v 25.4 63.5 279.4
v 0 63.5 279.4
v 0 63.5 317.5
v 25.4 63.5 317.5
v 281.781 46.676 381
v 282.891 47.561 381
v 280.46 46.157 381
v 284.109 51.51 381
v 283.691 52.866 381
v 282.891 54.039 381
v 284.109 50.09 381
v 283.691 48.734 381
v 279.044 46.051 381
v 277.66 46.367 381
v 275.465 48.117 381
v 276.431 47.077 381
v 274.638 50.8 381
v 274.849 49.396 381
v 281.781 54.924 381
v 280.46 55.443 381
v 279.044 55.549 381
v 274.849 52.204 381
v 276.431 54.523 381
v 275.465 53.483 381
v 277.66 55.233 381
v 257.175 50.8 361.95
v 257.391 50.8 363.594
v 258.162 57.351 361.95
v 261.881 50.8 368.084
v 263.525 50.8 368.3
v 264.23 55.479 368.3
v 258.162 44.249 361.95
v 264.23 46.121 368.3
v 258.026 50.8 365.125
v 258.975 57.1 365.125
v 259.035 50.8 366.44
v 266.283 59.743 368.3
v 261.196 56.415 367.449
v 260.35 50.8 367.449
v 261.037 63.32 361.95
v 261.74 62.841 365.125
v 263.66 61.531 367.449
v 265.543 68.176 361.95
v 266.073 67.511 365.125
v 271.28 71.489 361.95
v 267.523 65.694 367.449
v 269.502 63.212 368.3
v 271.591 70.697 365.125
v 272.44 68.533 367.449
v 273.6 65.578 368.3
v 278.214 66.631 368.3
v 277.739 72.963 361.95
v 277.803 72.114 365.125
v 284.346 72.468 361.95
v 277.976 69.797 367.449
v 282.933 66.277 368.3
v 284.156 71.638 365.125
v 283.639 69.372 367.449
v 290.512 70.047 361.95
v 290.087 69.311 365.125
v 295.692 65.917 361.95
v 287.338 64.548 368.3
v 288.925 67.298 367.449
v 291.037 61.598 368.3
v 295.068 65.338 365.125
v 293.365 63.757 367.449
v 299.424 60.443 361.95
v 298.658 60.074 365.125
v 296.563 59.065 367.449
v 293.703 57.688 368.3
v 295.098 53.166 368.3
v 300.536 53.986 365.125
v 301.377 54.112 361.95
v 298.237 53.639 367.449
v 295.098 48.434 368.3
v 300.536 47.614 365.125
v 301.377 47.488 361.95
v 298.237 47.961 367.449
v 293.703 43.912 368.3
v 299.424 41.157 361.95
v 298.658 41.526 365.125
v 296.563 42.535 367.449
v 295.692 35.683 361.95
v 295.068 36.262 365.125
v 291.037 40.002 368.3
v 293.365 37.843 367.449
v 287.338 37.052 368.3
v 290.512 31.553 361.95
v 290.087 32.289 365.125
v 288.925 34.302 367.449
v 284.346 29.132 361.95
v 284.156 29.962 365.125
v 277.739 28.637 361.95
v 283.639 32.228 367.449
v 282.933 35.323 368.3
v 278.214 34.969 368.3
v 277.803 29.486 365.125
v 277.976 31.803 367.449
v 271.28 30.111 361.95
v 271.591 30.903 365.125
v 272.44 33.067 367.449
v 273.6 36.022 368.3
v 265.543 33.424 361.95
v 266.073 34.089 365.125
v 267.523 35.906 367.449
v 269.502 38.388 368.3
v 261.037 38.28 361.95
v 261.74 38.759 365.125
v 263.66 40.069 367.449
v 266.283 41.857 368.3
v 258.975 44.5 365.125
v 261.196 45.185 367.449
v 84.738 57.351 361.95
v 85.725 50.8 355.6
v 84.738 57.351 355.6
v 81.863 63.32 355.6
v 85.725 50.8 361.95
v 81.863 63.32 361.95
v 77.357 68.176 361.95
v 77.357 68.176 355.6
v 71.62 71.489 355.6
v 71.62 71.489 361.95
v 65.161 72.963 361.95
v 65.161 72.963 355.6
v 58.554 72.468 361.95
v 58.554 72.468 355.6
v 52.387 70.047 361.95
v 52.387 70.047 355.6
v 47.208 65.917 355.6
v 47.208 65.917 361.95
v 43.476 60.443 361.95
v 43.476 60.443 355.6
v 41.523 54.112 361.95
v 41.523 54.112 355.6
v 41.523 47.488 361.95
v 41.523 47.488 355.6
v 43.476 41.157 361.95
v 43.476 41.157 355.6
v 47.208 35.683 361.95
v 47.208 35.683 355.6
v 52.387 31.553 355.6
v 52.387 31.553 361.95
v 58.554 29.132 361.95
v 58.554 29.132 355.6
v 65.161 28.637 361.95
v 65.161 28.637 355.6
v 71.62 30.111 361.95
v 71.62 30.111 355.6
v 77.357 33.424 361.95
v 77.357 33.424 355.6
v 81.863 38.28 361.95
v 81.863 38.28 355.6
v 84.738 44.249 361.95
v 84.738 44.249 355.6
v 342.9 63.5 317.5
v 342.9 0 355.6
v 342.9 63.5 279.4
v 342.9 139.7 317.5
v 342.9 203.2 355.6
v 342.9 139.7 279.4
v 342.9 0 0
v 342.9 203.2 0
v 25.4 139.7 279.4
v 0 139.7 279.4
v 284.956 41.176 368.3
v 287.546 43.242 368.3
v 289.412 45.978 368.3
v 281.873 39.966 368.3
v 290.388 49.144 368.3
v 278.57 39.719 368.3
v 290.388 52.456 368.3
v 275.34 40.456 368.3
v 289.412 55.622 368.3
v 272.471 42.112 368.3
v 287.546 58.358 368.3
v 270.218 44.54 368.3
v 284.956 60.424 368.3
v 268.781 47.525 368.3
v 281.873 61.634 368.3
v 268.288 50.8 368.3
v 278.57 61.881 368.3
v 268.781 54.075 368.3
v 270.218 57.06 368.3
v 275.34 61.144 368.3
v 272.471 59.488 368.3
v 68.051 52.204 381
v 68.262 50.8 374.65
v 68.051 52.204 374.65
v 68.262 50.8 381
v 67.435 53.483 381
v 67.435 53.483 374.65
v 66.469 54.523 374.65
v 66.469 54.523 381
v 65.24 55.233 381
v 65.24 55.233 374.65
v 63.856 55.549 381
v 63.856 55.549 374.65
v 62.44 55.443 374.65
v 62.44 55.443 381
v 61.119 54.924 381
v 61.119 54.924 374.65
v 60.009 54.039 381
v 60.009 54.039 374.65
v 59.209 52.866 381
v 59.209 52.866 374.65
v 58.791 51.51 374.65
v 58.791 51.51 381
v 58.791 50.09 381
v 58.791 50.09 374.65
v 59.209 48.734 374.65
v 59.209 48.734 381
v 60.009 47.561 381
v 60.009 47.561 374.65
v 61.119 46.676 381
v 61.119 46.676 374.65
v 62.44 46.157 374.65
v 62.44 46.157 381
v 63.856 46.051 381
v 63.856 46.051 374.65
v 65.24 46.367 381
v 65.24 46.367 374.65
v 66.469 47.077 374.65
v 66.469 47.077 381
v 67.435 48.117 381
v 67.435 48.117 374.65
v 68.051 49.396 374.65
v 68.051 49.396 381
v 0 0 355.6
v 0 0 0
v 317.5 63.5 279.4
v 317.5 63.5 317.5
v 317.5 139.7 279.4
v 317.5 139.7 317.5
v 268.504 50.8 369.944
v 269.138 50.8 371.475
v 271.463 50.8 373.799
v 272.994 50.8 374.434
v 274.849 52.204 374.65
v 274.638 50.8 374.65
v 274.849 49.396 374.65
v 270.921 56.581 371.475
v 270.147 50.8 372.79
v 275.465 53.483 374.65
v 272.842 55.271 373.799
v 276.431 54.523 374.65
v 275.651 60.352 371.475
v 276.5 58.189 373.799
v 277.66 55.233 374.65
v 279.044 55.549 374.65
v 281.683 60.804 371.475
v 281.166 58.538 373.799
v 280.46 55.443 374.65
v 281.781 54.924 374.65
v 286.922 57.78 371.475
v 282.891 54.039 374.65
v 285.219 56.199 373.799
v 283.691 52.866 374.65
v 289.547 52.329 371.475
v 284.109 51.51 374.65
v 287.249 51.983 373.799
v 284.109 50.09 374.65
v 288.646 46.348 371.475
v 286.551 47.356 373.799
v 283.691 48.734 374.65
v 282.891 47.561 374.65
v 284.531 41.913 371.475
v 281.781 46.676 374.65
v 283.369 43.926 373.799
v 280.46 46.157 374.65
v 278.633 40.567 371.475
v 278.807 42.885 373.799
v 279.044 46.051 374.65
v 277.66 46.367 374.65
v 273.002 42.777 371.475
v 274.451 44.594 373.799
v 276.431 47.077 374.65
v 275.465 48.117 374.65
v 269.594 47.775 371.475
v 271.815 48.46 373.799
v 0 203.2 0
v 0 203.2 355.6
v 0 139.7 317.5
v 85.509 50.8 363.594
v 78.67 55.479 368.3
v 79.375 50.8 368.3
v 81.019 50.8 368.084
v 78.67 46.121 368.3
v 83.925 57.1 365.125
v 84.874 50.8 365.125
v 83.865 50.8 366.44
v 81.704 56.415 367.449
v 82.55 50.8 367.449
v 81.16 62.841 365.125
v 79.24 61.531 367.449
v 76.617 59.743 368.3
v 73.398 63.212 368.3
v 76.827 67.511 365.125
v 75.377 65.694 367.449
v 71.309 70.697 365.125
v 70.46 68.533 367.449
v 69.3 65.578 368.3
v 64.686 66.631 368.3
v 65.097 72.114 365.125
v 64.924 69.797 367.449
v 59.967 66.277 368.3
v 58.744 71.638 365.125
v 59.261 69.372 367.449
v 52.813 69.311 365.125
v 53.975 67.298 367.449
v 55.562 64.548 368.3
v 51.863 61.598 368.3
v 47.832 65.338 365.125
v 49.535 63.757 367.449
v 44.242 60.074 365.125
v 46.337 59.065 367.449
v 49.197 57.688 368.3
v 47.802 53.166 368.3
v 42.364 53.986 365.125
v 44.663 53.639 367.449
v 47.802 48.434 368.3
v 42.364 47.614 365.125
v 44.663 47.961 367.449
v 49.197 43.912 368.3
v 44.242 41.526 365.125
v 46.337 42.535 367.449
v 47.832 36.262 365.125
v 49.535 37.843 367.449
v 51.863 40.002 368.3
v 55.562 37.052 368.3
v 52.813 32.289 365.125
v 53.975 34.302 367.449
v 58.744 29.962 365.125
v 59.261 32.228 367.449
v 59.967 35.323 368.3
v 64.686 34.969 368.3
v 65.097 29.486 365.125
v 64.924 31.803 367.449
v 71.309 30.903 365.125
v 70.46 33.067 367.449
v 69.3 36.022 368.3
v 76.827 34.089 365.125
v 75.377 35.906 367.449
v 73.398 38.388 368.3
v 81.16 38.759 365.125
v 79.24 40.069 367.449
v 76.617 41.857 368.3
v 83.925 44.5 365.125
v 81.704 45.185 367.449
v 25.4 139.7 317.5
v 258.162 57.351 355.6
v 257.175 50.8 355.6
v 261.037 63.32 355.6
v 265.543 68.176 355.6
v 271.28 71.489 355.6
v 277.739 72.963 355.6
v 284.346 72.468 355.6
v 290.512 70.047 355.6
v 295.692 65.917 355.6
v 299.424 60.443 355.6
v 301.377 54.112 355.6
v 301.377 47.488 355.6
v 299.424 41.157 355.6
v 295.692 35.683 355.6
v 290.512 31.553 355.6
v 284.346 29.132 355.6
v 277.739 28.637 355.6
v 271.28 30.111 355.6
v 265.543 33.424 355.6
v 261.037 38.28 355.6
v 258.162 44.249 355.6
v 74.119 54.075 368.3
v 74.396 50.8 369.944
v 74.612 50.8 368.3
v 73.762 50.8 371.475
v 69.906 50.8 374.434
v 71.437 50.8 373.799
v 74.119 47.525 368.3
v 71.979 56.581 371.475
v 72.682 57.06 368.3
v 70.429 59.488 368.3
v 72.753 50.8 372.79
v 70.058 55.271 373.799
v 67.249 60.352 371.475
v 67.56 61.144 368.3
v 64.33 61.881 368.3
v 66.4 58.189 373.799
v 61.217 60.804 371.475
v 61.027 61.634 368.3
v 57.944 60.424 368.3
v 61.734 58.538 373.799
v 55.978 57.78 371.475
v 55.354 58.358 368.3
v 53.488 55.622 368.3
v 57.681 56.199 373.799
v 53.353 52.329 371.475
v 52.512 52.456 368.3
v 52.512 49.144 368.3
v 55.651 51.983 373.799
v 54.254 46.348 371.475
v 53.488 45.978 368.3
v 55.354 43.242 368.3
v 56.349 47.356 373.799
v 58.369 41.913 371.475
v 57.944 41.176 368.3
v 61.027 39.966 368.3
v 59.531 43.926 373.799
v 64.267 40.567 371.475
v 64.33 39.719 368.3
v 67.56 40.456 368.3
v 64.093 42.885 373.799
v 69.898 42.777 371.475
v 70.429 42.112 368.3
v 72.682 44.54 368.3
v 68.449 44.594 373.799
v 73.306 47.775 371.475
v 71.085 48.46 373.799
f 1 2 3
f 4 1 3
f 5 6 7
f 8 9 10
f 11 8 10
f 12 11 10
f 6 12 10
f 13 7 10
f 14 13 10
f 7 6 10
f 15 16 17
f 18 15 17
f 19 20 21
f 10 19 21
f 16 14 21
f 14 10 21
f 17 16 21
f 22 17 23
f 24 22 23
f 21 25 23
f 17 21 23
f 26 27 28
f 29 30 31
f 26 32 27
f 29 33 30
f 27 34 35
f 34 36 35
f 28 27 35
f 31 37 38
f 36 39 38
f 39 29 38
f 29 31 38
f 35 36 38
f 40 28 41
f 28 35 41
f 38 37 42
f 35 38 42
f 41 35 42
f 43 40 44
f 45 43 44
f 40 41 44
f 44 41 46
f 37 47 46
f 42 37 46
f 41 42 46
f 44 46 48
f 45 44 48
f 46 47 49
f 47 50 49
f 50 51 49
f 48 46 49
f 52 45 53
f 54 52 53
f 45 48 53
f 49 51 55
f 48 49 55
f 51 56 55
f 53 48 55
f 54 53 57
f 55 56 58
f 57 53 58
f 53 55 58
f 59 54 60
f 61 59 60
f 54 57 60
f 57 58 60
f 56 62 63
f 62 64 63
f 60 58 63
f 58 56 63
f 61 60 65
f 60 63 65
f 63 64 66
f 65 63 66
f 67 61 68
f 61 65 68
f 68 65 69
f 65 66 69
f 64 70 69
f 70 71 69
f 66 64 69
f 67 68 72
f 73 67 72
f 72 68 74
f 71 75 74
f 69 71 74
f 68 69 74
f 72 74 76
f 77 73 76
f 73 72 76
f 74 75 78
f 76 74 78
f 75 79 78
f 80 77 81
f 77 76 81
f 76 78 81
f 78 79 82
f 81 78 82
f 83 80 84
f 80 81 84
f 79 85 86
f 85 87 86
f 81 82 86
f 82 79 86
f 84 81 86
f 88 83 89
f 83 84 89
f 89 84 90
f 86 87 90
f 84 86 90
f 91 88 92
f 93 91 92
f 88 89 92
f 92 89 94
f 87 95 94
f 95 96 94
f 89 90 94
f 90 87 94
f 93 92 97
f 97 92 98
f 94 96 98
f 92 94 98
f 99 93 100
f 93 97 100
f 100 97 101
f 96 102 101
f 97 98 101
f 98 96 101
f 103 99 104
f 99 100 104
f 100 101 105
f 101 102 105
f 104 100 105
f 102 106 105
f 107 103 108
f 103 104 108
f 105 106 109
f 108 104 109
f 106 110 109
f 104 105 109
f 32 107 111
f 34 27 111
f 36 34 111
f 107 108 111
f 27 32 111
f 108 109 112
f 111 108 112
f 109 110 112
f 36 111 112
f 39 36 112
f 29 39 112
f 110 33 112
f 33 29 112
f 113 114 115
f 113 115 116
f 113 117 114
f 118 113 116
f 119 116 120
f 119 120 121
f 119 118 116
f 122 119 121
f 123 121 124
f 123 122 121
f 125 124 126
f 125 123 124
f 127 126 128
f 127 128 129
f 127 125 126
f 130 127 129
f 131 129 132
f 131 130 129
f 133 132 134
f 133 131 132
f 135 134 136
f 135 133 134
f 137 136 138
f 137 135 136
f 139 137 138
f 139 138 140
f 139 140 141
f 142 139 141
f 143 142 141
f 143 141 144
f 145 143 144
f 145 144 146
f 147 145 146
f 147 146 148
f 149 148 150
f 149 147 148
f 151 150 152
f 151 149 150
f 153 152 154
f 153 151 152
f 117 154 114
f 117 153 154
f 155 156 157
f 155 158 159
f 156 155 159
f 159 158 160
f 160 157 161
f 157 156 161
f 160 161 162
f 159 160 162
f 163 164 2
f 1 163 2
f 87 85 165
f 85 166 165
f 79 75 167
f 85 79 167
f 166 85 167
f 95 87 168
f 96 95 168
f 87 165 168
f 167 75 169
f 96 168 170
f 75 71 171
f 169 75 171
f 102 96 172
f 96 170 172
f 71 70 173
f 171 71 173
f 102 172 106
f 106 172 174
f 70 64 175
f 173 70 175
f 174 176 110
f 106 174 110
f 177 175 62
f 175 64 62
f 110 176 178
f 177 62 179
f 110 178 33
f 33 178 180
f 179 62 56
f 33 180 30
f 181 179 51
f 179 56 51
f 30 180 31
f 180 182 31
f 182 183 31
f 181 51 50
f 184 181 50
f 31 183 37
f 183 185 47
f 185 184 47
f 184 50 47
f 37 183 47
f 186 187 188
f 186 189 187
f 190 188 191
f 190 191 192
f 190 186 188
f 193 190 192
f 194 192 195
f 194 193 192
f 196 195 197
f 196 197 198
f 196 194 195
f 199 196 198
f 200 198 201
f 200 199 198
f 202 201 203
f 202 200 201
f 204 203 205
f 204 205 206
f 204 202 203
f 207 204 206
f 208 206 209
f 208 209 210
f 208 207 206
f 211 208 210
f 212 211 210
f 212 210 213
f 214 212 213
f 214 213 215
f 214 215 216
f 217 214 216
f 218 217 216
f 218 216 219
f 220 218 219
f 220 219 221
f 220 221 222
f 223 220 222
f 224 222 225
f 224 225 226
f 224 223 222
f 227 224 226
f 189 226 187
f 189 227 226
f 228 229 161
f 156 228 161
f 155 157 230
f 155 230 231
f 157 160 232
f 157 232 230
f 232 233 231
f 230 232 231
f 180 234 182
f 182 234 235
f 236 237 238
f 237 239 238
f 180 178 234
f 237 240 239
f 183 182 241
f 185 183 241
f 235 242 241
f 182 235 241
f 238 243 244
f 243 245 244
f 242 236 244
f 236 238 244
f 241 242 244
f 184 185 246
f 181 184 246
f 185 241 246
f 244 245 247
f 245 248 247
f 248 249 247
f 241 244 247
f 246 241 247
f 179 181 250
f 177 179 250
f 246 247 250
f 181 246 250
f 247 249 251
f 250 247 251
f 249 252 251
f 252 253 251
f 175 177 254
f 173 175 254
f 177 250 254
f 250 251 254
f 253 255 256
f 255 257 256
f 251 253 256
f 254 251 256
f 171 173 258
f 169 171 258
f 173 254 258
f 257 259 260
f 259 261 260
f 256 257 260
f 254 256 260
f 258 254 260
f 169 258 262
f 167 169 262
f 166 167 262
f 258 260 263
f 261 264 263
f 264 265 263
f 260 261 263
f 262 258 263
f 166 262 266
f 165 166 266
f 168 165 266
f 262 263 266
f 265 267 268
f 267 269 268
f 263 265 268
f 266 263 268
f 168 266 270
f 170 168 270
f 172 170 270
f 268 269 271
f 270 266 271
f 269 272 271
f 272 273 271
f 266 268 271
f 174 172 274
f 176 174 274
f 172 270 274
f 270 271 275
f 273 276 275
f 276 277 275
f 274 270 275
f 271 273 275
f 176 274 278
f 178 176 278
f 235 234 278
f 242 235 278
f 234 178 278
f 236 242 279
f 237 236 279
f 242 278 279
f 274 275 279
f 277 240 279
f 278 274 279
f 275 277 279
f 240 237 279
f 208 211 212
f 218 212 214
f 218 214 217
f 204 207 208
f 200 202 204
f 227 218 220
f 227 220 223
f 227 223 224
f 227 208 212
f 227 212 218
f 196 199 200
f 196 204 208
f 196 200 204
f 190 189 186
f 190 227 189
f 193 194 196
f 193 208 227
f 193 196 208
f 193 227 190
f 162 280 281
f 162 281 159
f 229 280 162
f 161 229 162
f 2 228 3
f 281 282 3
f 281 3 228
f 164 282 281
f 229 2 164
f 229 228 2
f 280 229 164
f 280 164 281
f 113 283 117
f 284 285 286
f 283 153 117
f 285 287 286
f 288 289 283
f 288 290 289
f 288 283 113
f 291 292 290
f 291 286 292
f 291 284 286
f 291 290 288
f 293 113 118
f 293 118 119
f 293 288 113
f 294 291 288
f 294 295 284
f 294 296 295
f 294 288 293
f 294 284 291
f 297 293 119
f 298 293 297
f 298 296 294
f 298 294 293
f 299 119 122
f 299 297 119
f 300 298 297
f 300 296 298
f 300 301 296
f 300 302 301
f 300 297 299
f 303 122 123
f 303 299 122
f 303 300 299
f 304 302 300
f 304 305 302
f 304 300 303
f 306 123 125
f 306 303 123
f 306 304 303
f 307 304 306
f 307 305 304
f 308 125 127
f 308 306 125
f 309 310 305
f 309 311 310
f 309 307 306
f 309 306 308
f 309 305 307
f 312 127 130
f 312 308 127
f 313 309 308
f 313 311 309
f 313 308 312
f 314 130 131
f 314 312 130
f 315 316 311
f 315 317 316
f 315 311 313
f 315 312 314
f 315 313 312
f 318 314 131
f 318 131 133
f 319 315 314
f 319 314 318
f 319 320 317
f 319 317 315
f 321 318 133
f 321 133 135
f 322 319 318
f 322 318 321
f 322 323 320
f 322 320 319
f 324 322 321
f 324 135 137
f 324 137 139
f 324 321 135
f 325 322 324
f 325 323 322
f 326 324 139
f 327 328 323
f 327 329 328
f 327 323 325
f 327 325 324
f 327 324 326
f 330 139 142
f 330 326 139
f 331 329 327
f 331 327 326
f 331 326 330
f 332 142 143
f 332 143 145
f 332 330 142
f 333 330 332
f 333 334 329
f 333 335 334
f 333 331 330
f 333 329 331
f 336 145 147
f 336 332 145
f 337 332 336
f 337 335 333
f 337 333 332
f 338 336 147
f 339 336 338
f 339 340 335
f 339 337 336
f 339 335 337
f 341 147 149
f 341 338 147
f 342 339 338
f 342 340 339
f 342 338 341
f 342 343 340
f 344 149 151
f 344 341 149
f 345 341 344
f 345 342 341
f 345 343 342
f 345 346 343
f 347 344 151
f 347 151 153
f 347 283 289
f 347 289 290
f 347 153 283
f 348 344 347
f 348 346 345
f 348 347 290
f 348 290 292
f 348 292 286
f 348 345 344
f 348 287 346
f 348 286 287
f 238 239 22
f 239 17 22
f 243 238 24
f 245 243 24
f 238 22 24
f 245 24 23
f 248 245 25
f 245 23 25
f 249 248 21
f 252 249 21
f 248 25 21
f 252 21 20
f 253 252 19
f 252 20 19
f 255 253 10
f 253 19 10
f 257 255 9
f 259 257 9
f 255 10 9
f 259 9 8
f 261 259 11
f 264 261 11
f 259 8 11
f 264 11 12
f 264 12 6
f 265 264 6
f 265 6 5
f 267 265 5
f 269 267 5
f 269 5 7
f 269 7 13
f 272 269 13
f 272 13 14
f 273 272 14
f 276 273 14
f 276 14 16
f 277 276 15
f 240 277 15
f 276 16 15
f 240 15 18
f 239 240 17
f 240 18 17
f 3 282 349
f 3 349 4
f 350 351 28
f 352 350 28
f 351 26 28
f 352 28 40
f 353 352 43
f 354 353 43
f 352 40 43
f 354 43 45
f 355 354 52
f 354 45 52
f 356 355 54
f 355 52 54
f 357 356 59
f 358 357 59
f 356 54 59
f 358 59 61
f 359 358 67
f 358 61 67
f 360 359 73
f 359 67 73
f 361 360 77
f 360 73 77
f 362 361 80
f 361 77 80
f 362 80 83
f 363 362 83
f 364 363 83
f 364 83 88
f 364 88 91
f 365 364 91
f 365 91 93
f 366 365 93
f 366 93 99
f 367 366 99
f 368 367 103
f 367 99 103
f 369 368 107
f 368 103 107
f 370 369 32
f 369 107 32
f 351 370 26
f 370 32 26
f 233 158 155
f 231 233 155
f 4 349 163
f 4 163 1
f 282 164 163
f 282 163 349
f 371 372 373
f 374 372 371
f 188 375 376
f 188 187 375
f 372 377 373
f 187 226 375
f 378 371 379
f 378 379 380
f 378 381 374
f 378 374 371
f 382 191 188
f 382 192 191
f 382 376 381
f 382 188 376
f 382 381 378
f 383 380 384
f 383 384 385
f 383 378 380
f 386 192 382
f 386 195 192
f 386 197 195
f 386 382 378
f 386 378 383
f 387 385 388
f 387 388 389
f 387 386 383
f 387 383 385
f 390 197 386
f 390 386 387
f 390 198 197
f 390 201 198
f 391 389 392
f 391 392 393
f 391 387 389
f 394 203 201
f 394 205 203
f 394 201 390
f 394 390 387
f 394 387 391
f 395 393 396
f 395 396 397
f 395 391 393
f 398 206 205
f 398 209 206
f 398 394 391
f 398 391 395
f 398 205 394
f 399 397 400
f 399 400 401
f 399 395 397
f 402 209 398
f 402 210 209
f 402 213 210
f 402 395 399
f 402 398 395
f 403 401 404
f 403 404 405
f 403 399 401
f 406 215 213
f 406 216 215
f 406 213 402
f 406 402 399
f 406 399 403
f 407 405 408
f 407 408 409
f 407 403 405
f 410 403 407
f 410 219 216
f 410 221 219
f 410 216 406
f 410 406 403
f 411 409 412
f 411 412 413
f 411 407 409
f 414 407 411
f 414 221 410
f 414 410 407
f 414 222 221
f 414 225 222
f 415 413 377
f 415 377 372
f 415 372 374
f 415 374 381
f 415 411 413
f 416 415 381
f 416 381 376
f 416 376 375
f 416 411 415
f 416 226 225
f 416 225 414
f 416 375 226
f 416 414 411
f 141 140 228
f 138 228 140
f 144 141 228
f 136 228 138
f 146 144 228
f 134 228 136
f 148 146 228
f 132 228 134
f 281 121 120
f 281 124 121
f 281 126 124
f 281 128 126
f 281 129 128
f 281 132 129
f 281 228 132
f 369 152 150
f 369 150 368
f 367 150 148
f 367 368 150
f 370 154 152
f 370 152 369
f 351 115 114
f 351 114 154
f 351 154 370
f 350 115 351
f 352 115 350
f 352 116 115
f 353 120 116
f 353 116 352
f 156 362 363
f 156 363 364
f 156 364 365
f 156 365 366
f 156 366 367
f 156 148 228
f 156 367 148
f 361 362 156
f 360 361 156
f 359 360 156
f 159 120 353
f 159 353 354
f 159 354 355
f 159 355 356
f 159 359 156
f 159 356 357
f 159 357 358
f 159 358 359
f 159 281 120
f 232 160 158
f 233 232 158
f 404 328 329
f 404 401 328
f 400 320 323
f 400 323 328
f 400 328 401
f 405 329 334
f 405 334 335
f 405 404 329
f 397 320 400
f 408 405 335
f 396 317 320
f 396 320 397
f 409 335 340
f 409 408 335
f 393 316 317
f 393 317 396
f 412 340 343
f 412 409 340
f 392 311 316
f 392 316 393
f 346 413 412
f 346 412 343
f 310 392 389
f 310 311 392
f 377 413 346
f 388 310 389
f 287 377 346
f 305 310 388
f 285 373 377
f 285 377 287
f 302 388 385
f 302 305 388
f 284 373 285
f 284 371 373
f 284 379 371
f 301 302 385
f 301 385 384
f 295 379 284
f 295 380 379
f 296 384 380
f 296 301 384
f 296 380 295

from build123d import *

# Parameters (mm, degrees)
F0_W     = 342.9
F0_H     = 203.2
F1_DEPTH = 355.6
F6_W     = 76.2
F6_H     = 38.1
F7_DEPTH = 25.4


# Not quite as in the source:
# - a pattern or mirror of a feature is missing from the dataset's text; its kind, count and spacing are read off the source's solid


with BuildPart() as f1:
    # F0 (on Top) → F1 (new body)
    with BuildSketch(Plane.XY):
        with Locations((171.45, 101.6)):
            Rectangle(F0_W, F0_H)
    extrude(amount=F1_DEPTH)

    # F3 (on offset) → F4 (revolve)
    with BuildSketch(Plane.XZ.offset(-50.8)):
        with BuildLine():
            Line((63.5, 381), (63.5, 355.6))
            Line((63.5, 355.6), (85.725, 355.6))
            Line((85.725, 355.6), (85.725, 361.95))
            ThreePointArc((85.725, 361.95), (83.8651280605, 366.4401280605), (79.375, 368.3))
            Line((79.375, 368.3), (74.6125, 368.3))
            ThreePointArc((74.6125, 368.3), (72.7526280605, 372.7901280605), (68.2625, 374.65))
            Line((68.2625, 374.65), (68.2625, 381))
            Line((68.2625, 381), (63.5, 381))
        make_face()
    f4 = revolve(axis=Axis((63.5, 50.8, 362.4166101217), (0, 0, 1)))

    # F4_copies: F4 across plane
    add(f4.mirror(Plane(origin=(171.45, 0, 0), x_dir=(0, 0, 1), z_dir=(1, 0, 0))))

    # F6 (on face) → F7 (cut)
    with BuildSketch(Plane(origin=(0, 0, 0), x_dir=(0, -1, 0), z_dir=(-1, 0, 0))):
        with Locations((-101.6, 298.45)):
            Rectangle(F6_W, F6_H)
    f7 = extrude(amount=-F7_DEPTH, mode=Mode.SUBTRACT)

    # F7_copies: F7 across plane
    add(f7.mirror(Plane(origin=(171.45, 0, 0), x_dir=(0, 0, 1), z_dir=(1, 0, 0))), mode=Mode.SUBTRACT)


solid = f1.part
